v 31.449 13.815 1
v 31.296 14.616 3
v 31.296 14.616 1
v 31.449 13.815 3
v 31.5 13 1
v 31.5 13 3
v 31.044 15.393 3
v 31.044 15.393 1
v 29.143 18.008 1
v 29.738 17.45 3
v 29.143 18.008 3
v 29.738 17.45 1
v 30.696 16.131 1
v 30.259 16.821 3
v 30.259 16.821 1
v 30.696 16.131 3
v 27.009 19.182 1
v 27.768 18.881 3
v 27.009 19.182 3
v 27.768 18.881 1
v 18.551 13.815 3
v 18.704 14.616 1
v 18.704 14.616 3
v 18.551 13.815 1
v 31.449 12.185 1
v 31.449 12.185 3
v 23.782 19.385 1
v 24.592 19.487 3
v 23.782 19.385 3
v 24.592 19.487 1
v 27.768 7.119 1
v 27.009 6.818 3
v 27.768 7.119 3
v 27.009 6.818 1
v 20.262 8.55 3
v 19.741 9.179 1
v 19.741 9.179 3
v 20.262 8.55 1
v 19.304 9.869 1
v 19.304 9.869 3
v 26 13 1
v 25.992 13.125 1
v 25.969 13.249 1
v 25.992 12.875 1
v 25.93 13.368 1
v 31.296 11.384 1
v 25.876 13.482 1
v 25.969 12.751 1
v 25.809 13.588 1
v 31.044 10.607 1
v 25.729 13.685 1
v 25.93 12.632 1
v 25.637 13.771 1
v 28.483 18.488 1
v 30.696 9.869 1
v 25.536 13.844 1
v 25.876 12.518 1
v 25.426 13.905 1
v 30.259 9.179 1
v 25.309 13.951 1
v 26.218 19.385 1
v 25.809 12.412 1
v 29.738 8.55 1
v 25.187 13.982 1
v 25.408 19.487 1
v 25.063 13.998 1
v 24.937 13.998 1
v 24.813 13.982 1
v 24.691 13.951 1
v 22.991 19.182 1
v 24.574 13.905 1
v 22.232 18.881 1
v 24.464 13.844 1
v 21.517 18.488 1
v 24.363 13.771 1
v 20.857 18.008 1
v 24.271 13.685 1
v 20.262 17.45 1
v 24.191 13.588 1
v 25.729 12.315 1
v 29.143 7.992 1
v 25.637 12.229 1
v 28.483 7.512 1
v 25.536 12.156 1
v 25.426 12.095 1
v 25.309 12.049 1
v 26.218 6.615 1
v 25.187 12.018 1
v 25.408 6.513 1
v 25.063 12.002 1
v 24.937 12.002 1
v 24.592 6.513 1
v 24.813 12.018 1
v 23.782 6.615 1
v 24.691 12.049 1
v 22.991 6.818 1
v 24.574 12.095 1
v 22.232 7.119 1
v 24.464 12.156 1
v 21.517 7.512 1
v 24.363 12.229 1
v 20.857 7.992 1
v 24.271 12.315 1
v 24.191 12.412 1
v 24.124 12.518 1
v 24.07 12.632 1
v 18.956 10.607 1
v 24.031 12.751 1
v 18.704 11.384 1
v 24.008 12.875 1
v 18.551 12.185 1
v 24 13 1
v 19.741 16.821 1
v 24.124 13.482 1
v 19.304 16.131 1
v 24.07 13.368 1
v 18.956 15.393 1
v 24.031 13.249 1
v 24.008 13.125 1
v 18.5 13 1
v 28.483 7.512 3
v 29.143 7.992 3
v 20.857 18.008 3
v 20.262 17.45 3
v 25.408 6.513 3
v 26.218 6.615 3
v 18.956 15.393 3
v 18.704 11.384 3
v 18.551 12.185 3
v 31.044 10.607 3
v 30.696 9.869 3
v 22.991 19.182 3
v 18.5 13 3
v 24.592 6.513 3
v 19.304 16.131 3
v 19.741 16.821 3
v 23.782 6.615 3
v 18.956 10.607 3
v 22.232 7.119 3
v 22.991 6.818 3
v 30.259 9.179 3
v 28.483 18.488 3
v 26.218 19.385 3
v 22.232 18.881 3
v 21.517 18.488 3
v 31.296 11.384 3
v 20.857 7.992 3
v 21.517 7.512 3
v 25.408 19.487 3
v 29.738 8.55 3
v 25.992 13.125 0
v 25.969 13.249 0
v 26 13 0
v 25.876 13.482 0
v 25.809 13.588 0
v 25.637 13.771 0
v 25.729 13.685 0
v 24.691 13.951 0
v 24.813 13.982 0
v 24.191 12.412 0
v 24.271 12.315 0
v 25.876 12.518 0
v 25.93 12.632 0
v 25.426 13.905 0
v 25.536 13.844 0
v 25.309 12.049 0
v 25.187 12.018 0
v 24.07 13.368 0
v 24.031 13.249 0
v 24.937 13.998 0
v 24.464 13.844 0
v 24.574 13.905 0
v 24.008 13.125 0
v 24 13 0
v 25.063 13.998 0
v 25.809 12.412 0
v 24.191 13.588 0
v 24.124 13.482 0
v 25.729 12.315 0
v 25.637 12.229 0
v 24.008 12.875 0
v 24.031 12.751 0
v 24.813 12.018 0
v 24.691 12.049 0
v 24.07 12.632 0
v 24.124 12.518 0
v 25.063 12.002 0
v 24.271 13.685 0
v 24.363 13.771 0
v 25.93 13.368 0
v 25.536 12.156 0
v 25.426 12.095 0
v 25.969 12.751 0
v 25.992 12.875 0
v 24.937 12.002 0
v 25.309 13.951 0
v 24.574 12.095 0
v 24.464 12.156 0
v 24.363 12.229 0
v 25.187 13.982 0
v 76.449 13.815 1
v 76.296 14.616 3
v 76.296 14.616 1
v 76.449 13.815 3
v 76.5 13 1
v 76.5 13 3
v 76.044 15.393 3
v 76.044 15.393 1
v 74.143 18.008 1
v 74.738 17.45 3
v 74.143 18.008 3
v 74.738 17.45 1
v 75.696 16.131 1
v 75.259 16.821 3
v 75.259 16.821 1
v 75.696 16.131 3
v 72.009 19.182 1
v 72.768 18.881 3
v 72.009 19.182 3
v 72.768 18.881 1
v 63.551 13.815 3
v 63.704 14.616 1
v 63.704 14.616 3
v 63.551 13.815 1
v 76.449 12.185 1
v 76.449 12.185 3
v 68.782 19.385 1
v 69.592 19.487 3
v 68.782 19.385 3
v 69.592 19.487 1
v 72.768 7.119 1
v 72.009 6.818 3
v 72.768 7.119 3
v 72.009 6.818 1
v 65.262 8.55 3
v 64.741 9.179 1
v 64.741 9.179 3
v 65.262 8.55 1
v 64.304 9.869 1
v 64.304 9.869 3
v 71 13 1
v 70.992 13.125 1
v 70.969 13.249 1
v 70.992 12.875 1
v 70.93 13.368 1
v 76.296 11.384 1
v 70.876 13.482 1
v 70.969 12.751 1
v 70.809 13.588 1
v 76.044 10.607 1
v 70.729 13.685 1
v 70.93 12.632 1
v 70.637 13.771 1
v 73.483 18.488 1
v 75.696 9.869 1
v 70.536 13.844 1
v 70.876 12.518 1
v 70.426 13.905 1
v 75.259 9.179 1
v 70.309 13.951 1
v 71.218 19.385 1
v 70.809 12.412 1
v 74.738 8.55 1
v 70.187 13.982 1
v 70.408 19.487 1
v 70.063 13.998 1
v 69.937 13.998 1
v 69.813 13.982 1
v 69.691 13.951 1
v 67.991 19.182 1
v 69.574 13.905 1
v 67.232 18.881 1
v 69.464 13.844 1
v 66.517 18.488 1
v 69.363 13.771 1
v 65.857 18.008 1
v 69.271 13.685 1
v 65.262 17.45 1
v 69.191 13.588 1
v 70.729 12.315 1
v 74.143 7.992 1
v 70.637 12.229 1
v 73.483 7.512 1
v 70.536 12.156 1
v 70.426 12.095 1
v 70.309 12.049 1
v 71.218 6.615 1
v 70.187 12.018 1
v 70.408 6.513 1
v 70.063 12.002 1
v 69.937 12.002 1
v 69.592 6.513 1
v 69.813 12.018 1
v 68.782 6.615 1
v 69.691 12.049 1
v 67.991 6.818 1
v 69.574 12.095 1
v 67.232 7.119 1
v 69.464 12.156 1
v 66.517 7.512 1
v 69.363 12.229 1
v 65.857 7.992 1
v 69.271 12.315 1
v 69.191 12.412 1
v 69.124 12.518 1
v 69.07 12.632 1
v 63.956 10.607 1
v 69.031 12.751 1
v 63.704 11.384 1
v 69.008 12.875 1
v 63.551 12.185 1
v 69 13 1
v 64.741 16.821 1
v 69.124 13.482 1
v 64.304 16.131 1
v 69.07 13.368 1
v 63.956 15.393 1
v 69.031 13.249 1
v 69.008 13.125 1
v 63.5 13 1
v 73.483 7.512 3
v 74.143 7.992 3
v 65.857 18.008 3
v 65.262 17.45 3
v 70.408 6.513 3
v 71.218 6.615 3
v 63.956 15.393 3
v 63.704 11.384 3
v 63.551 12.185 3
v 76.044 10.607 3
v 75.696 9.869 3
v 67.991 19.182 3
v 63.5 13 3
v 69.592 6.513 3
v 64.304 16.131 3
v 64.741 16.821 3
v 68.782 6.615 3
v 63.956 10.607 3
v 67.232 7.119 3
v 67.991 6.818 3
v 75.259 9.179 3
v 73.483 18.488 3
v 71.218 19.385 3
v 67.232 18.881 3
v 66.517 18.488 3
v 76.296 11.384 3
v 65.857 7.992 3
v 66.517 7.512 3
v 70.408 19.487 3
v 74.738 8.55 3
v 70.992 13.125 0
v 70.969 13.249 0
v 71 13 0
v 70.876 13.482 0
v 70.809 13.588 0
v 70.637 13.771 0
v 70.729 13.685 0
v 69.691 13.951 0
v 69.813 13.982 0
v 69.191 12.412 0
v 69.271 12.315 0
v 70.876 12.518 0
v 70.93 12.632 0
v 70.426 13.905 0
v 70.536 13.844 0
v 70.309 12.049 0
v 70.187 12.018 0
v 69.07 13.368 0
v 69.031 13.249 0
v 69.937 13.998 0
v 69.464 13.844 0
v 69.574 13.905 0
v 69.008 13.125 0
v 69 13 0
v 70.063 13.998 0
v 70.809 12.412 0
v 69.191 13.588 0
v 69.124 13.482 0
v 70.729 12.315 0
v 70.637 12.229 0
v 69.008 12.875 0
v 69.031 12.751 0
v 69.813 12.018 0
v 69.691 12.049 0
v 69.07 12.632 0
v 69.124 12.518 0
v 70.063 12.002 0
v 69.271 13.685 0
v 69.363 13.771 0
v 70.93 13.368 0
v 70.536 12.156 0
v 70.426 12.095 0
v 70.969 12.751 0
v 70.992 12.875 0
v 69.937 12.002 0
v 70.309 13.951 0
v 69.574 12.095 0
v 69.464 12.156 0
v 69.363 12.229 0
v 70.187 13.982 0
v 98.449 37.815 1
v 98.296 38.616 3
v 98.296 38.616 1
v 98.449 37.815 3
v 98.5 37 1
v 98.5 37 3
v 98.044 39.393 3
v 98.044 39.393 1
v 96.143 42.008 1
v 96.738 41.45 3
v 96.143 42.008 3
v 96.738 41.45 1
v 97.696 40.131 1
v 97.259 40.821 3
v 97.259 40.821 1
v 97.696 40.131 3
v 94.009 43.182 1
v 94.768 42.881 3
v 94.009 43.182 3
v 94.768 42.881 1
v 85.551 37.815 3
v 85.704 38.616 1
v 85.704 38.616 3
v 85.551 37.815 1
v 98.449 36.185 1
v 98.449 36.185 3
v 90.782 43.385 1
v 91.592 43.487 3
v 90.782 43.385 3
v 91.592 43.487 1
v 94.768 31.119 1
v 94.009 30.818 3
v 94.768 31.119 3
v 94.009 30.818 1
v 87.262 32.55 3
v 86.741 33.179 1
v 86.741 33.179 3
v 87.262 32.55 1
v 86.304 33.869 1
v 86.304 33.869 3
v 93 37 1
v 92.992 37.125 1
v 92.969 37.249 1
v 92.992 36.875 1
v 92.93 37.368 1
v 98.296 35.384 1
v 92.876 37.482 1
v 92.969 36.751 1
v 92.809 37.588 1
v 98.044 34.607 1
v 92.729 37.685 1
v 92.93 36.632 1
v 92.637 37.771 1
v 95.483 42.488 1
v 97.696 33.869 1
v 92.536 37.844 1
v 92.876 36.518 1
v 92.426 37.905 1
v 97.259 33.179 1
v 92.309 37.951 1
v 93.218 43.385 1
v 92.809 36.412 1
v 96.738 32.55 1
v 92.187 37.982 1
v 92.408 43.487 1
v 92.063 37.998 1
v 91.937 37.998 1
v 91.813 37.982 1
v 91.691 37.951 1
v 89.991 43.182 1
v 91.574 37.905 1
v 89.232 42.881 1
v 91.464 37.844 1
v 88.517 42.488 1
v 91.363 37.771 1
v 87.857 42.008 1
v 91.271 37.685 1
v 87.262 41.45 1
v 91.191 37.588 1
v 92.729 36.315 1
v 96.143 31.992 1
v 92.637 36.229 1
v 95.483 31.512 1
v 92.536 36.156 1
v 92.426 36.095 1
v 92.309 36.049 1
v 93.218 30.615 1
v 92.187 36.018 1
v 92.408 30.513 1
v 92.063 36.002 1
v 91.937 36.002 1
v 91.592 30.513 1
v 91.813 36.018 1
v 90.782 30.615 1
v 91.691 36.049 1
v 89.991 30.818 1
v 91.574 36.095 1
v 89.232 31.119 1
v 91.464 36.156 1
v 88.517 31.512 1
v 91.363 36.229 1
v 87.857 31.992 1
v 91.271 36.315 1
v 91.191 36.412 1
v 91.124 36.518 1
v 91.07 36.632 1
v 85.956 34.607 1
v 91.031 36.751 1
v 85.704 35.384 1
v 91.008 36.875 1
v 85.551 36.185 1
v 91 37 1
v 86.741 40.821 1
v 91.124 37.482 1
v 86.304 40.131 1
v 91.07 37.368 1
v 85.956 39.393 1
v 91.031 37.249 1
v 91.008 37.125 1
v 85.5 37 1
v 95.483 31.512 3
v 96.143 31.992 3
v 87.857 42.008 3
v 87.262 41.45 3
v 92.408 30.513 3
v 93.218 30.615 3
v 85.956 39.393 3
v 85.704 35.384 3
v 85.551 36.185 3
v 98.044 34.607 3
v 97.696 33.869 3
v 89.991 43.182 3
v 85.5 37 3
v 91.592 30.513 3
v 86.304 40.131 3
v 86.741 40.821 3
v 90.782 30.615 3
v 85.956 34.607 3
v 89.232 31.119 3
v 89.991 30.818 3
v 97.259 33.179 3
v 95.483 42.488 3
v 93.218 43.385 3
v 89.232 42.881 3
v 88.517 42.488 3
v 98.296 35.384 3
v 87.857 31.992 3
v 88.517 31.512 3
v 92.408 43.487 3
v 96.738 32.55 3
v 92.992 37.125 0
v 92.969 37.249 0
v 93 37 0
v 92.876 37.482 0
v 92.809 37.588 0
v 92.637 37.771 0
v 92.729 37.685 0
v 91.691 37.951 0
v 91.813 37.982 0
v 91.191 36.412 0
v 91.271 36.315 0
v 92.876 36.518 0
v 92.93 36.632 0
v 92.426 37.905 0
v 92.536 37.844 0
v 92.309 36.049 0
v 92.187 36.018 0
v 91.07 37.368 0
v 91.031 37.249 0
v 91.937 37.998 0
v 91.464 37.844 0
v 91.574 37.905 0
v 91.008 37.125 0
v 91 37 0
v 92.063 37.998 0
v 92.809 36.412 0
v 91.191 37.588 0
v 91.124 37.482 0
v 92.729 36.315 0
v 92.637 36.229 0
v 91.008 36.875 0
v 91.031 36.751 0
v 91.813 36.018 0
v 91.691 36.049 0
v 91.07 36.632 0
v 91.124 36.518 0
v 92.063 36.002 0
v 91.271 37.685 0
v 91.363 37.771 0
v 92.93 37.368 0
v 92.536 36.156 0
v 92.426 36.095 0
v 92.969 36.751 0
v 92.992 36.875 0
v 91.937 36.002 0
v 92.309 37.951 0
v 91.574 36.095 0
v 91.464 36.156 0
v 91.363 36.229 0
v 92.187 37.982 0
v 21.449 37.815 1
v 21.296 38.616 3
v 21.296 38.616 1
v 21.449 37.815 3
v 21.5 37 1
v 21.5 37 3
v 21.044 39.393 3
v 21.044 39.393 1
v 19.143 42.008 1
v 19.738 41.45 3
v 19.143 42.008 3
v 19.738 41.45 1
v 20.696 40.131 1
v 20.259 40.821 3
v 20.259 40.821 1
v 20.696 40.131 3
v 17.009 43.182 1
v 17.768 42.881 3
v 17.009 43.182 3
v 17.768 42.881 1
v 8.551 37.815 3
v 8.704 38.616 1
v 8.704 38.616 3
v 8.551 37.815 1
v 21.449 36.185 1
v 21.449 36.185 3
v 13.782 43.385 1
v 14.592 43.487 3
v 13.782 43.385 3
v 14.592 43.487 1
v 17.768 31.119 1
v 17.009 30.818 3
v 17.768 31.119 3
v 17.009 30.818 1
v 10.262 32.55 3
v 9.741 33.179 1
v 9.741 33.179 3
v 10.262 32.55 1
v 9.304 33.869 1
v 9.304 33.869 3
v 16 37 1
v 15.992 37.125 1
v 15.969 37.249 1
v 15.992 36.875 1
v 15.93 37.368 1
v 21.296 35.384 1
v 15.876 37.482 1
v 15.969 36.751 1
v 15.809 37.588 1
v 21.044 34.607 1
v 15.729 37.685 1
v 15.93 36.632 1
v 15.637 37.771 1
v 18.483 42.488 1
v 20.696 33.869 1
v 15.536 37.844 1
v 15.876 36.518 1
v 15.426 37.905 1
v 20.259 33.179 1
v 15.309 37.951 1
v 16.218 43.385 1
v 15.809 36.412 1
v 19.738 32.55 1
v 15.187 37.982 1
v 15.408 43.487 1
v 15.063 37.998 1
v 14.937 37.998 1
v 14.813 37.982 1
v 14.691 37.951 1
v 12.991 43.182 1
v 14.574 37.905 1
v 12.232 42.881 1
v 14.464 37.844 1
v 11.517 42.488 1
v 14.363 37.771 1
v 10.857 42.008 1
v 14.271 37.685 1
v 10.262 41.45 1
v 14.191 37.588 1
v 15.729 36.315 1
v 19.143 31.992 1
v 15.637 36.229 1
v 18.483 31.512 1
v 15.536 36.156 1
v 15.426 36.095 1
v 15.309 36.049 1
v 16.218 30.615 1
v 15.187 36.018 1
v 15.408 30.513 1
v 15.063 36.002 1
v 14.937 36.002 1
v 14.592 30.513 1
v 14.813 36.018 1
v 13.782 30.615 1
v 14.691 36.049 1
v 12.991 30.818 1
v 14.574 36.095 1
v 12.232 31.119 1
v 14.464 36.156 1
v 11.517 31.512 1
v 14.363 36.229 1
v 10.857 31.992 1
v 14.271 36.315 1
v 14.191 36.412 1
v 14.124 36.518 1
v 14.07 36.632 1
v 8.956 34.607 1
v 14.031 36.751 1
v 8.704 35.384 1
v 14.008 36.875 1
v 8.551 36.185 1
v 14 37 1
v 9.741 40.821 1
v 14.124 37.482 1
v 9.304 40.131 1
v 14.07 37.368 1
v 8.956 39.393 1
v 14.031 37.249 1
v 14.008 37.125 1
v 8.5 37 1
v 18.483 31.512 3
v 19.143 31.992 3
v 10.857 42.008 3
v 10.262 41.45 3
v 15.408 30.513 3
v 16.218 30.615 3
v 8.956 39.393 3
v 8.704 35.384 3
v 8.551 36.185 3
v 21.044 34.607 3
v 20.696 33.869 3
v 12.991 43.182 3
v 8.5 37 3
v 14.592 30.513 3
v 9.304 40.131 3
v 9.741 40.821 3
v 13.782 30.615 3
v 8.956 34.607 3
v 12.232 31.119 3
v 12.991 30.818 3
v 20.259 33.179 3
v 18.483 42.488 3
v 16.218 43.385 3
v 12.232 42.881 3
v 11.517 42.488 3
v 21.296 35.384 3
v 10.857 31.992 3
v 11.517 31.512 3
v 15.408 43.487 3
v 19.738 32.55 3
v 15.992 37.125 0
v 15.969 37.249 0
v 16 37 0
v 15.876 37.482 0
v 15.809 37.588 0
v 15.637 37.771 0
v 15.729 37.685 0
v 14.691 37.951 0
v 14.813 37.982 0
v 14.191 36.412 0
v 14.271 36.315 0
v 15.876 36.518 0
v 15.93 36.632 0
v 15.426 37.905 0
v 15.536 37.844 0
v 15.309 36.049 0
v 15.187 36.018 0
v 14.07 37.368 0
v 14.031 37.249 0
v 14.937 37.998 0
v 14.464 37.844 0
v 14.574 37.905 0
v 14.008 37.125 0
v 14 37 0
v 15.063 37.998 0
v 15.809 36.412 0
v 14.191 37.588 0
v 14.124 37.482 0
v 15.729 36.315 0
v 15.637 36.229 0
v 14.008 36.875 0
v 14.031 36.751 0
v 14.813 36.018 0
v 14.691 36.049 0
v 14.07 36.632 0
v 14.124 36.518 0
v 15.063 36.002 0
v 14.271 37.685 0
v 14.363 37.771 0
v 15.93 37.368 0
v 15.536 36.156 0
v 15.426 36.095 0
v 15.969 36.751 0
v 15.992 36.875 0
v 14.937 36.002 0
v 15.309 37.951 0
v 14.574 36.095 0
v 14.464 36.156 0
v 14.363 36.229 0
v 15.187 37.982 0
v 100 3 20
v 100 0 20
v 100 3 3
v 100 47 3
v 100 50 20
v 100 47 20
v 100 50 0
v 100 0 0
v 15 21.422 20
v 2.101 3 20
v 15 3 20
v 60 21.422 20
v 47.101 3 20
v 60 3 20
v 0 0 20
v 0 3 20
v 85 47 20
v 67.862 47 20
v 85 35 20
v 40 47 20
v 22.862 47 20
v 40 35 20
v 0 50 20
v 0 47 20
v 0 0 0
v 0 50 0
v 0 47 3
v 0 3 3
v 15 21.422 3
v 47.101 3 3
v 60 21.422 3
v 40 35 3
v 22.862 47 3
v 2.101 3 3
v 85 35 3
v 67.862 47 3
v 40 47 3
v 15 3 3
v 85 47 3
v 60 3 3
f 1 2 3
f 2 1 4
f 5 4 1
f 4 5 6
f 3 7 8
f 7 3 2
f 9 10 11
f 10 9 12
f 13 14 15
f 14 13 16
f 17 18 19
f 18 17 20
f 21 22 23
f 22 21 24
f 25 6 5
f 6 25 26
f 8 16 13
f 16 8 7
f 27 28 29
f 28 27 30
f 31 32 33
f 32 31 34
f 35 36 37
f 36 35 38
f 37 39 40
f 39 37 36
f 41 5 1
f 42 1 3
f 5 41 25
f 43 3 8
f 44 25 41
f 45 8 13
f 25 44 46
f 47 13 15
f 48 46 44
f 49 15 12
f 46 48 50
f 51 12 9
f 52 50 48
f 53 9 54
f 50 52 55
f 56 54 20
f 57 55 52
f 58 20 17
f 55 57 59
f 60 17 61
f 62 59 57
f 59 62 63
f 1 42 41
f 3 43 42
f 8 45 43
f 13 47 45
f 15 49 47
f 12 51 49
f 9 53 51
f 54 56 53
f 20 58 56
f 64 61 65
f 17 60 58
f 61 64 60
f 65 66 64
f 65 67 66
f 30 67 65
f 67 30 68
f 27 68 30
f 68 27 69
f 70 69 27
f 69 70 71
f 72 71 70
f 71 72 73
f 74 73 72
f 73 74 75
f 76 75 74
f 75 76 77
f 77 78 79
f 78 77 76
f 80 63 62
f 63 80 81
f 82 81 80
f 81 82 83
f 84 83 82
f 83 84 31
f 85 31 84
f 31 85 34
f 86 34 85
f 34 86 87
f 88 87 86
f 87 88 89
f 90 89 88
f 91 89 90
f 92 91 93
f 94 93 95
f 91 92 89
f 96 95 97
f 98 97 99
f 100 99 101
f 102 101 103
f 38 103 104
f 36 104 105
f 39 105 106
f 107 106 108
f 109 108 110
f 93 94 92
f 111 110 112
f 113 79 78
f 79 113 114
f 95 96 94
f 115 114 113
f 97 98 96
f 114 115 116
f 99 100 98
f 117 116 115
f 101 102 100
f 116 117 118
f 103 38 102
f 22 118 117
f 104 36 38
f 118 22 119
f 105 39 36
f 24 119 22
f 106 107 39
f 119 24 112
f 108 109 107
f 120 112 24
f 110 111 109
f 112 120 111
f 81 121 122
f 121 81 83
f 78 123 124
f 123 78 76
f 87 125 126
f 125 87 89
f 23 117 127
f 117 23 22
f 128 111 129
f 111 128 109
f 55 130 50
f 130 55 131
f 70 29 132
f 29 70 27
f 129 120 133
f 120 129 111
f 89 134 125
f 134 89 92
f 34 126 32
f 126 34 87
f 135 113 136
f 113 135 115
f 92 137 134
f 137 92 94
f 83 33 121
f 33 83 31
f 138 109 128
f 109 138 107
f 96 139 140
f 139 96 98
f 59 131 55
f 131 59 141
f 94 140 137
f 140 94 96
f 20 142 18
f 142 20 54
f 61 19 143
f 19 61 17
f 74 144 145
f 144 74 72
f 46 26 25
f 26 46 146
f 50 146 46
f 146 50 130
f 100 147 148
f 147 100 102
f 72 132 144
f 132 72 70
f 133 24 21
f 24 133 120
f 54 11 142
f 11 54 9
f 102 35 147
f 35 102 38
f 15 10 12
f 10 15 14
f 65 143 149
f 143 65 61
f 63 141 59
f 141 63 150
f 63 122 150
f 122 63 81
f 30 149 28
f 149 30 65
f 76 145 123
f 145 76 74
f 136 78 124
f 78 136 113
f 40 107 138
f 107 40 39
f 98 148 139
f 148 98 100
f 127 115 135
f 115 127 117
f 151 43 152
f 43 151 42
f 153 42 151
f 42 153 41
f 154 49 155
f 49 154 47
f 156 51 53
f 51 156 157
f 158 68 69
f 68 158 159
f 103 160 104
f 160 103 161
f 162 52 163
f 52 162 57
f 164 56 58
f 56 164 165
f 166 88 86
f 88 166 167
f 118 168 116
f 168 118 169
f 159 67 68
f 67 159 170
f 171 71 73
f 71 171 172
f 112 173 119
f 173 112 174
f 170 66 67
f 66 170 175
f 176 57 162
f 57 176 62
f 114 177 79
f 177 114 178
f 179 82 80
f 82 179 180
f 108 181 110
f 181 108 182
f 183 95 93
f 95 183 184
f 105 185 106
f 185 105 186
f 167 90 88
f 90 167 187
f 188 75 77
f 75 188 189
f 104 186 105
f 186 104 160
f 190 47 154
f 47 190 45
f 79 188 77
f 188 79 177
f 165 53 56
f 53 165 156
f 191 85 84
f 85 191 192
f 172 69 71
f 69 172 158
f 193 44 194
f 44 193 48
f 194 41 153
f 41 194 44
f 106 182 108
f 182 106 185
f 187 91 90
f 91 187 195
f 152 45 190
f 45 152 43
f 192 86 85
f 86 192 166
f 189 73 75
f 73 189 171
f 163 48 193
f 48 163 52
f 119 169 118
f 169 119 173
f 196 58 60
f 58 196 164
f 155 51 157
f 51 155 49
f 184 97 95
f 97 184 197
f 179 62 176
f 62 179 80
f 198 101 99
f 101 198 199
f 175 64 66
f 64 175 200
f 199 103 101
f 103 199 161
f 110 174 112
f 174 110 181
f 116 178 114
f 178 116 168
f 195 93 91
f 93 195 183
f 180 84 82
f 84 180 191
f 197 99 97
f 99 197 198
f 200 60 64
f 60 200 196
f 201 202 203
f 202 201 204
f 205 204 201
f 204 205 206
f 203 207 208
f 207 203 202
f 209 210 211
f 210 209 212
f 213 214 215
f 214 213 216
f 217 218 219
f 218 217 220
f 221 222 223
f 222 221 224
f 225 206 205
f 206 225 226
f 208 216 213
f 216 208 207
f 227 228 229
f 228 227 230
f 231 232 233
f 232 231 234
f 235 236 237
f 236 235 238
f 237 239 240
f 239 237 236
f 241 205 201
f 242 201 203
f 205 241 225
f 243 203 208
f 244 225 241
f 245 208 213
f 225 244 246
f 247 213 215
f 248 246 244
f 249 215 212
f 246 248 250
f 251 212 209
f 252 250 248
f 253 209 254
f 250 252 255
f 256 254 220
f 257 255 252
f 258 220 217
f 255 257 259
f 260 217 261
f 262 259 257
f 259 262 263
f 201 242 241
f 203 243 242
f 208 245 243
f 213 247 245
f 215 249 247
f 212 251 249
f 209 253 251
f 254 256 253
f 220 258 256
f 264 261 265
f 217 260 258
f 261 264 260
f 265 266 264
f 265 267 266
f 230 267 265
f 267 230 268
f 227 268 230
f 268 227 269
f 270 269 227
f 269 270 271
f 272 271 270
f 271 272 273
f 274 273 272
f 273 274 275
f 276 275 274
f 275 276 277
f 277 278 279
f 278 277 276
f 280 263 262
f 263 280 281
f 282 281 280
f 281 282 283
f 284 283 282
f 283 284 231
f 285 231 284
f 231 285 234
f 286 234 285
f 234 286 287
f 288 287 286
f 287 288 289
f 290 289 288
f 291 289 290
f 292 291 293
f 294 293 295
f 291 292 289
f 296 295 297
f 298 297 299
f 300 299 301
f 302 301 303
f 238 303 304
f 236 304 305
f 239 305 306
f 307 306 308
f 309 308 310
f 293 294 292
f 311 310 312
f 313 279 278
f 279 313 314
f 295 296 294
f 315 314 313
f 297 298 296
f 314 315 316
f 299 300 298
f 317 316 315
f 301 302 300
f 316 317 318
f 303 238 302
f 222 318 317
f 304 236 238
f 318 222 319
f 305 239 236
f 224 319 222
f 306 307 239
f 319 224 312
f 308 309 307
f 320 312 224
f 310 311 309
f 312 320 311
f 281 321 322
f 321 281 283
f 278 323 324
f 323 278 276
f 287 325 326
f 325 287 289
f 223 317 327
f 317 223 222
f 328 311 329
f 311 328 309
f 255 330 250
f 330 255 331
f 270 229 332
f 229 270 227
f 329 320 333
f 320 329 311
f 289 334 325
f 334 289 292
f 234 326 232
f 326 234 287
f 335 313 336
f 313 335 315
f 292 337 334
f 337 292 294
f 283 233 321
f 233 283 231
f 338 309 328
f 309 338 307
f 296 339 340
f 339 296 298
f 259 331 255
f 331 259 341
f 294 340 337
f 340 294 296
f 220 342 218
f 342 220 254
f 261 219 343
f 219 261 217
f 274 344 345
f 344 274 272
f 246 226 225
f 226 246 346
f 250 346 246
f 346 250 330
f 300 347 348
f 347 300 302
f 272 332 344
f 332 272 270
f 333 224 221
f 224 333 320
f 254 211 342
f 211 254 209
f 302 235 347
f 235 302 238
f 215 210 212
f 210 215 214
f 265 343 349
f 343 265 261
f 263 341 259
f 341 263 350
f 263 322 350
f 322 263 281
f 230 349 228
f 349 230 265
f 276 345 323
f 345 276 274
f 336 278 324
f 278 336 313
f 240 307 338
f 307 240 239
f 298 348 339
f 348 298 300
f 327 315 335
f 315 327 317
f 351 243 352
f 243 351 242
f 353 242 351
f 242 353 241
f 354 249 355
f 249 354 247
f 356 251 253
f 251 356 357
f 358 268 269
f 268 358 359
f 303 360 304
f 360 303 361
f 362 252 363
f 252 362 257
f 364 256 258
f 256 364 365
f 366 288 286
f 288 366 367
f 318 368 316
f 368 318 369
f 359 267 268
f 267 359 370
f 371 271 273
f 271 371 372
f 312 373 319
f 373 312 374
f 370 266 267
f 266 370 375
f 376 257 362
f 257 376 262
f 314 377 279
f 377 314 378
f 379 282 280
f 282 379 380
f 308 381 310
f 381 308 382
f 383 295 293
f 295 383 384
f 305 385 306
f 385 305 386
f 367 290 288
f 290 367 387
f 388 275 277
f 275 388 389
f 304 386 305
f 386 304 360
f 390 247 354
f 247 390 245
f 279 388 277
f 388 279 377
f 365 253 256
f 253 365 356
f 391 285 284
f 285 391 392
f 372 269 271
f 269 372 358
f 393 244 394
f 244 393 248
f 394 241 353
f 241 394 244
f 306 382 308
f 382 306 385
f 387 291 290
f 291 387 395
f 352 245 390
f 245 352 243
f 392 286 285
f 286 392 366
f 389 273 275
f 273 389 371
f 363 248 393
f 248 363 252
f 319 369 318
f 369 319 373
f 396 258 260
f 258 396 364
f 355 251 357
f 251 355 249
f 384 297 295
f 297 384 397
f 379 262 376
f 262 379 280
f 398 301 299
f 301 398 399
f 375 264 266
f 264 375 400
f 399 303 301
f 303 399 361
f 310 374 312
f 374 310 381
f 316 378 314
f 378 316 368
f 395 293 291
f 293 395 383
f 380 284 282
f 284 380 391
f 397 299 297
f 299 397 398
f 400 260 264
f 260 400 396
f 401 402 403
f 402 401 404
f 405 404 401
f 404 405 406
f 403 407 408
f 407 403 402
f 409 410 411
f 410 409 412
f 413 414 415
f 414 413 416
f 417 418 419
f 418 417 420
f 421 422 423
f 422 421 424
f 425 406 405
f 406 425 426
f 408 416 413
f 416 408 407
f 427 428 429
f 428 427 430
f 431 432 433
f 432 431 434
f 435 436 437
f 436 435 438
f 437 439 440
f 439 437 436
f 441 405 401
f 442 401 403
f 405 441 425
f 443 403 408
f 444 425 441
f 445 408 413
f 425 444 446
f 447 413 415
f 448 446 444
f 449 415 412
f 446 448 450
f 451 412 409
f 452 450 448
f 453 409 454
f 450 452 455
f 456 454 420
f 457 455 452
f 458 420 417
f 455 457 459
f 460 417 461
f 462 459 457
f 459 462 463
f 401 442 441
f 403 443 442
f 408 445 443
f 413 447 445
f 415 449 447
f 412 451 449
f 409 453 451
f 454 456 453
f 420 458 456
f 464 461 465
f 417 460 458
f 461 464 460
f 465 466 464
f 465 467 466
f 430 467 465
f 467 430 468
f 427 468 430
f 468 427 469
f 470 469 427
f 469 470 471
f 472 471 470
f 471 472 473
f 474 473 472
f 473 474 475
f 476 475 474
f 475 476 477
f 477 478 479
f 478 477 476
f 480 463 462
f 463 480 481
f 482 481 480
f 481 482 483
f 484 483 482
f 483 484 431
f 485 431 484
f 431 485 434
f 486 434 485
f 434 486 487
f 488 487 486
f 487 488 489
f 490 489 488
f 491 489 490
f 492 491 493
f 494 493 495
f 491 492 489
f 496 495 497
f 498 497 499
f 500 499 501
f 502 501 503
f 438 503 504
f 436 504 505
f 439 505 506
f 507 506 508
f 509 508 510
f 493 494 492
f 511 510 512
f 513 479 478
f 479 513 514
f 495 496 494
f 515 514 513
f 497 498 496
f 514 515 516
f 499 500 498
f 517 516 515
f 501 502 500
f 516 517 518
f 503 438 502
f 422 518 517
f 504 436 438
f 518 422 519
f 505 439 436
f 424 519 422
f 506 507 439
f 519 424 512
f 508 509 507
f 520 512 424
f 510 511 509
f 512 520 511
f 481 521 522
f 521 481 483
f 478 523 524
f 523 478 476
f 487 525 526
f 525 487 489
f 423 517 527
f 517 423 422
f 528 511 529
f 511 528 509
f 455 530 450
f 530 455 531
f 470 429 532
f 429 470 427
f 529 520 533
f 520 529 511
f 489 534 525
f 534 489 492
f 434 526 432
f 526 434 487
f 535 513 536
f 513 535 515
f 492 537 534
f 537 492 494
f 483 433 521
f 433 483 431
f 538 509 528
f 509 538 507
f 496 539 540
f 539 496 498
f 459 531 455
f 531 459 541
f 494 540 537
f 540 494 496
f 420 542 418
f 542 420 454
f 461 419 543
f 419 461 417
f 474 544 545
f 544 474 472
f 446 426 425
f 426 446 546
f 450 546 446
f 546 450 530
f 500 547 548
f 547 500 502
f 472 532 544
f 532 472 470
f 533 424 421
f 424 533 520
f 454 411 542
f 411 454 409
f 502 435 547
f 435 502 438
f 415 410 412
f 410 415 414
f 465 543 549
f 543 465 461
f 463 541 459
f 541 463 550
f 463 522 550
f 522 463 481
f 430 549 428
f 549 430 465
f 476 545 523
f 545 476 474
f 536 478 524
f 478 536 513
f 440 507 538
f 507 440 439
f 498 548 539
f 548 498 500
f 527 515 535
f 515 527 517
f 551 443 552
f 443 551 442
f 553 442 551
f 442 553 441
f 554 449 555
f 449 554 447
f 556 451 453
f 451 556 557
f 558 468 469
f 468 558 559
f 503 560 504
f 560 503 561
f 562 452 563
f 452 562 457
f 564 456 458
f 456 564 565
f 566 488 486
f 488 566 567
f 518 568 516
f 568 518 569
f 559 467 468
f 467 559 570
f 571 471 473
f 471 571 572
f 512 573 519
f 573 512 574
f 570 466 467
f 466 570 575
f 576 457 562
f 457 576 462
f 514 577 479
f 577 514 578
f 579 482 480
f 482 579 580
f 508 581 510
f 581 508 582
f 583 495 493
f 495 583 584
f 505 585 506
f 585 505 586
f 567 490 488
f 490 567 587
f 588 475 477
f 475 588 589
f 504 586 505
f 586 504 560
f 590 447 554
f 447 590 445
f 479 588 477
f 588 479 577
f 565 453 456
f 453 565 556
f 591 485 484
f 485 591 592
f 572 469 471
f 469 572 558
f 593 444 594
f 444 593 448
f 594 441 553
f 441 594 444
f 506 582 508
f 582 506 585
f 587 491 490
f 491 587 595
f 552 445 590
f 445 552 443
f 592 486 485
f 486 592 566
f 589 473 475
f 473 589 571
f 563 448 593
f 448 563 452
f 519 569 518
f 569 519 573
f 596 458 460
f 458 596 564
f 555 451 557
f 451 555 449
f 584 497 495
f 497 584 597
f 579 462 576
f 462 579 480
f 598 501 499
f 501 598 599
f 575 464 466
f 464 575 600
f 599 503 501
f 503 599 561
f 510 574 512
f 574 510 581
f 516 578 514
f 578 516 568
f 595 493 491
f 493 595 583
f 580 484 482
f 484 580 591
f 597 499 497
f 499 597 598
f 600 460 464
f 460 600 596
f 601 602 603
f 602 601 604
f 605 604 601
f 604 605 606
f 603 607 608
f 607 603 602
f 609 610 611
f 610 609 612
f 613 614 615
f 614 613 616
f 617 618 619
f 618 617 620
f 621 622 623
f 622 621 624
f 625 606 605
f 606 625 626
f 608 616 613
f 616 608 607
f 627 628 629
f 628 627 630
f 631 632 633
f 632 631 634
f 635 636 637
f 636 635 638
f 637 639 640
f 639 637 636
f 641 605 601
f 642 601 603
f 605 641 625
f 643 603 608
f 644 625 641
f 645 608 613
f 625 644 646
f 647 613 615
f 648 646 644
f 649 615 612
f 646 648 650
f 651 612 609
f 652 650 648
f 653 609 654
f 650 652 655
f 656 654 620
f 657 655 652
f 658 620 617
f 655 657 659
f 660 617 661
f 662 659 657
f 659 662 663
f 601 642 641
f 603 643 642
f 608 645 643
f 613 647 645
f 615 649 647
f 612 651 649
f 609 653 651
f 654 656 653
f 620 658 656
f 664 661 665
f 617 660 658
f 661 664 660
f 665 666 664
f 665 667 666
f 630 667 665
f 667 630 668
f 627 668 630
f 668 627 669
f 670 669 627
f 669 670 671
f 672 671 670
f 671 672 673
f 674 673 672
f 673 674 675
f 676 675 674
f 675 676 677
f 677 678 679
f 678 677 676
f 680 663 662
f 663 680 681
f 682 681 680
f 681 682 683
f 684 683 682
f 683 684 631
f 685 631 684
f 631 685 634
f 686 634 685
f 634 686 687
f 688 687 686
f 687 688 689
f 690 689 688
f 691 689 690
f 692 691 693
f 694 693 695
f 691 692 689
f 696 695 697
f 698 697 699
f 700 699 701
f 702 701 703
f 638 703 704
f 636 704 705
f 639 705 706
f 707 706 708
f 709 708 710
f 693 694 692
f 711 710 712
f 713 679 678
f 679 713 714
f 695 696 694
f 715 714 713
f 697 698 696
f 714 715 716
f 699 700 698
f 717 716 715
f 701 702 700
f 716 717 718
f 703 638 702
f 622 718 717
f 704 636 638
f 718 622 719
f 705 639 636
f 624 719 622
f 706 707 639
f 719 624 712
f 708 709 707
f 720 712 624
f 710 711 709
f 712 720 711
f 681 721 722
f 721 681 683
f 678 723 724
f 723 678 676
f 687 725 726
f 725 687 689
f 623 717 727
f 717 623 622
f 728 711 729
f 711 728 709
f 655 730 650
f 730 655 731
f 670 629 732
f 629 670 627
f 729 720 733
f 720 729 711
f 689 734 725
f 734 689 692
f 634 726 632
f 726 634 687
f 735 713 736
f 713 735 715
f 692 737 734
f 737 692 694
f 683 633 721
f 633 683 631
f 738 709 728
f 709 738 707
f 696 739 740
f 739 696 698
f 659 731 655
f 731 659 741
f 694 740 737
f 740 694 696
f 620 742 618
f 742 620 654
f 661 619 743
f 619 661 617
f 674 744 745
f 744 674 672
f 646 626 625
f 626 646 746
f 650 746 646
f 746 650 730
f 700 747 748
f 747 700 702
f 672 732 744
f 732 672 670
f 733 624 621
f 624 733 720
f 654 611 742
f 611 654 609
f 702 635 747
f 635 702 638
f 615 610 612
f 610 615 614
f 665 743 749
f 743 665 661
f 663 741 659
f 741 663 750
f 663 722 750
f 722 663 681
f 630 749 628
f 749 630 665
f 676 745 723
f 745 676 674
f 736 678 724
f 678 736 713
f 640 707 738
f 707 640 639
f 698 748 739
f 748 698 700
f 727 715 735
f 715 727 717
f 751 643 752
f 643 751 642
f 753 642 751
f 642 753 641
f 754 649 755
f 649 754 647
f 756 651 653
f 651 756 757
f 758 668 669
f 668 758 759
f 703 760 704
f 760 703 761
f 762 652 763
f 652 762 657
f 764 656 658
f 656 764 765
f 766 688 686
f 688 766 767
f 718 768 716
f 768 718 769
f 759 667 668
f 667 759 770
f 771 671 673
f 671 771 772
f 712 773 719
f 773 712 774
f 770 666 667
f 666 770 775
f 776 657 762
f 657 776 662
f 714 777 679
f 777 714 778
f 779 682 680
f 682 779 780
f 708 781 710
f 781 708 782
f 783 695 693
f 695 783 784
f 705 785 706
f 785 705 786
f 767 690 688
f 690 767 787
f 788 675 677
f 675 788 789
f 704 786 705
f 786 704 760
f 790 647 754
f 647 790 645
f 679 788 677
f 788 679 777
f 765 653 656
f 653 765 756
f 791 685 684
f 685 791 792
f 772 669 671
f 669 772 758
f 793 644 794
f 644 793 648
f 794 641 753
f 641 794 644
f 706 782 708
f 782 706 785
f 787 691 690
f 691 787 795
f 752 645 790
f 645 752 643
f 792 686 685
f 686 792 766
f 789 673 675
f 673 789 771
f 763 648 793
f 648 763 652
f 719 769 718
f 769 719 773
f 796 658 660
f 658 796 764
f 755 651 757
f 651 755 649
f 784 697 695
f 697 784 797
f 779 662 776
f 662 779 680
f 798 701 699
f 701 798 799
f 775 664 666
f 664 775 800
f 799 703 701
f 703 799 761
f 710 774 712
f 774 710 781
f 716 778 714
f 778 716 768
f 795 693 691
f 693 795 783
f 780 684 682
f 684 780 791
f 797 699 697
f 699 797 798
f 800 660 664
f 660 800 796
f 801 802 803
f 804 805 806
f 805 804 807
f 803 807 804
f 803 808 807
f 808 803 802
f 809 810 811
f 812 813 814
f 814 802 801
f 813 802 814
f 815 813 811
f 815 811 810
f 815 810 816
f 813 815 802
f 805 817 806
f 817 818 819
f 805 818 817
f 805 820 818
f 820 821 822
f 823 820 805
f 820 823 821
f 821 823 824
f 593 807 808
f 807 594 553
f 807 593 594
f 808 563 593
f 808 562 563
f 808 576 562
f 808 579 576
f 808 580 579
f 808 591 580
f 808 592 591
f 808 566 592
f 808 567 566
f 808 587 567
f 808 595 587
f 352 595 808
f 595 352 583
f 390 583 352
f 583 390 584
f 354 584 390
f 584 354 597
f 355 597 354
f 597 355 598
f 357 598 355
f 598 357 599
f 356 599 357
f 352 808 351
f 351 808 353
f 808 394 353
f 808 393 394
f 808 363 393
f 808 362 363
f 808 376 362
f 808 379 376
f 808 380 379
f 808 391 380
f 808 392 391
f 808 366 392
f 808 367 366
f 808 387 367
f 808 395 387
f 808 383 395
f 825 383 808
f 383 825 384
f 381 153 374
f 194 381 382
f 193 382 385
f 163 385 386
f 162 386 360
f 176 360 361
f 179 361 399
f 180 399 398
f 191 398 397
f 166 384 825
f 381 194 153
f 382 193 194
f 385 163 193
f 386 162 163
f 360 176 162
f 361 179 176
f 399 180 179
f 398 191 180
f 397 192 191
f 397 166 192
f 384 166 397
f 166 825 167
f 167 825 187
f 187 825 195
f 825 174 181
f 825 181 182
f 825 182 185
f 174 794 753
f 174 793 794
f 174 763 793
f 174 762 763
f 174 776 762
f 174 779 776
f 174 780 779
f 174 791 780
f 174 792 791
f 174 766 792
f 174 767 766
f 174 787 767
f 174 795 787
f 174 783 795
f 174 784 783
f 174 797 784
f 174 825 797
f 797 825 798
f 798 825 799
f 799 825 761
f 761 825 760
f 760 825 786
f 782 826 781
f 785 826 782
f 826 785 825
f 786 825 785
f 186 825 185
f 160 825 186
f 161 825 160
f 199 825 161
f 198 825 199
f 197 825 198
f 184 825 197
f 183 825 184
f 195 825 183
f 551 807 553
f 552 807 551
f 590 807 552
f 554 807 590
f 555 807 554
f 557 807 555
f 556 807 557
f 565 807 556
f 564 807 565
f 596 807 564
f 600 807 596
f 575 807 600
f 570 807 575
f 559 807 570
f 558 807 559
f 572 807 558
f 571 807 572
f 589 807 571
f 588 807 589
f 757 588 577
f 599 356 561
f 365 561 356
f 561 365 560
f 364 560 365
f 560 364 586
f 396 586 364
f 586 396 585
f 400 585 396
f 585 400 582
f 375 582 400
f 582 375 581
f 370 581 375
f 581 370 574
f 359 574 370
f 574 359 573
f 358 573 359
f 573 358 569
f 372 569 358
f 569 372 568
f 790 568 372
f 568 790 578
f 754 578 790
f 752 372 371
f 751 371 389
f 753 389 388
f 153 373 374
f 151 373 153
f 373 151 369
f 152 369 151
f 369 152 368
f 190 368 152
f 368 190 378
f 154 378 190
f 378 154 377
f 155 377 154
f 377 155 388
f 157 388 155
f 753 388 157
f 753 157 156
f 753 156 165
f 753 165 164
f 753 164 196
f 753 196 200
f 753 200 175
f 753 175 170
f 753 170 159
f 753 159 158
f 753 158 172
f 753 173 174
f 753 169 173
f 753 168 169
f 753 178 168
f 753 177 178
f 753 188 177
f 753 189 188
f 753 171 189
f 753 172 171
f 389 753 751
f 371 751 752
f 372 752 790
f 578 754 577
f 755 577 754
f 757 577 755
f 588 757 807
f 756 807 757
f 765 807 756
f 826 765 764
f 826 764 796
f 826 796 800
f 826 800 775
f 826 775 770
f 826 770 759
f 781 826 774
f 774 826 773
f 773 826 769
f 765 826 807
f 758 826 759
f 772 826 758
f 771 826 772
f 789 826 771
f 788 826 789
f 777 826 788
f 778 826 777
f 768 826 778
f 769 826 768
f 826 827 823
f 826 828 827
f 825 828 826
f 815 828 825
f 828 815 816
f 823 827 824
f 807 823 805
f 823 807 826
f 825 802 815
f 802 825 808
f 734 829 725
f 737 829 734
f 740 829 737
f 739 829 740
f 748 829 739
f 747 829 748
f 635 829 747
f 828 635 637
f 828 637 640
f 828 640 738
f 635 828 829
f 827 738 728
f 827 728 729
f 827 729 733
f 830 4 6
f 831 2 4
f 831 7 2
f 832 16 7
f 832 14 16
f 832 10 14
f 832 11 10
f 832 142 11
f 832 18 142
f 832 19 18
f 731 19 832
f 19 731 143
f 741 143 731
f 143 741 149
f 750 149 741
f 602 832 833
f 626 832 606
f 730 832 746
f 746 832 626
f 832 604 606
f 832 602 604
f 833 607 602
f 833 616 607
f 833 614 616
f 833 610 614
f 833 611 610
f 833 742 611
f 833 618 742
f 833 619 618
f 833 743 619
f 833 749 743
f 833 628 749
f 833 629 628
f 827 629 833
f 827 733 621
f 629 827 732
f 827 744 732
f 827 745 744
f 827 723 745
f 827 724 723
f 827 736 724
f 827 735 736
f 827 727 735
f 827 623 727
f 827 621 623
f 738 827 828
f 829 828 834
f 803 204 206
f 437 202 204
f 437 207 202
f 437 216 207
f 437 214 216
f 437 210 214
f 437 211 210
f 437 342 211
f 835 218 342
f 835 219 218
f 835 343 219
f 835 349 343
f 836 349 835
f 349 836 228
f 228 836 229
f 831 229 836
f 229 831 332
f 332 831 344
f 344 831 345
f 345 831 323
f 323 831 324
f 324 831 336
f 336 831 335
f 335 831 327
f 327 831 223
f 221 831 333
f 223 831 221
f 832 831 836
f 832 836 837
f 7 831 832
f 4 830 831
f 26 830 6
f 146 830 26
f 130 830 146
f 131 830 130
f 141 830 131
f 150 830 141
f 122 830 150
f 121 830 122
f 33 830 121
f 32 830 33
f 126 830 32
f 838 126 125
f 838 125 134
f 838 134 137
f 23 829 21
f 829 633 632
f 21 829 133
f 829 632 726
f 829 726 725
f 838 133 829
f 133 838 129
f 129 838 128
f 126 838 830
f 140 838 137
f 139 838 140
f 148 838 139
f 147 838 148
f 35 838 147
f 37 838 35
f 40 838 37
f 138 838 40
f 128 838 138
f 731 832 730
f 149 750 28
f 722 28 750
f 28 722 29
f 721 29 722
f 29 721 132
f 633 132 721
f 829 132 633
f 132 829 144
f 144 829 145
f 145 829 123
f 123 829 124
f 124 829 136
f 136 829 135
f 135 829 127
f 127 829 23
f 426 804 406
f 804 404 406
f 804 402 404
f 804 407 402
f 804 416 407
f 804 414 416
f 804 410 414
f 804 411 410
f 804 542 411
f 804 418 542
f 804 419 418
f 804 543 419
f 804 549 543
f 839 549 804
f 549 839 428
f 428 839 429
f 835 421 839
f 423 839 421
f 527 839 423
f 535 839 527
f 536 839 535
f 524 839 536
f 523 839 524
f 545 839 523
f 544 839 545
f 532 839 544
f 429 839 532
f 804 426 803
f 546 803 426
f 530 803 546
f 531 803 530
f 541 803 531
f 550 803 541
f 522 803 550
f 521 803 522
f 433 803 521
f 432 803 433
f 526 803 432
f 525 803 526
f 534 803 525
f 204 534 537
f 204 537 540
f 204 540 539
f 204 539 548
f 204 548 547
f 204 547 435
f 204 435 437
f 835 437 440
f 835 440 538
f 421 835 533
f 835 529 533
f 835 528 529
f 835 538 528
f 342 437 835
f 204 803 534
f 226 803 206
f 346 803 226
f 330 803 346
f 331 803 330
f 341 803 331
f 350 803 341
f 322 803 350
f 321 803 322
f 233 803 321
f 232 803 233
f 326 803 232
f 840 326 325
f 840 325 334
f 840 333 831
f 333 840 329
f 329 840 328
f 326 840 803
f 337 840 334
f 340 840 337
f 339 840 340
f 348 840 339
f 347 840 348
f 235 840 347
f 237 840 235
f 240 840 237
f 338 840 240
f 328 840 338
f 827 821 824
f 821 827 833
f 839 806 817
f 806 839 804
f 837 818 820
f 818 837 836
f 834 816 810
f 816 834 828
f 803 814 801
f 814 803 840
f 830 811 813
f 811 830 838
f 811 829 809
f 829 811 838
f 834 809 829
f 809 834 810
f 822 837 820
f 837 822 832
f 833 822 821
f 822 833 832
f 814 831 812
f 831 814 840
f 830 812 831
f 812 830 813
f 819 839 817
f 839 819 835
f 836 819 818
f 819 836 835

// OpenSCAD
box_width=100;
box_depth=50;
box_height=20;
thickness=3;

//resolution
$fn=50;

difference()
{
   
// the big cube
cube([box_width,box_depth, box_height]);
translate([-0.5,thickness,thickness])
cube([box_width+1,box_depth-2*thickness, box_height+1]);

translate([25,13,0])
thumbtack_hole();

translate([70,13,0])
thumbtack_hole();

translate([92,37,0])
thumbtack_hole();

translate([15,37,0])
thumbtack_hole();

}





module ledge()
{
translate([0,0,0])
difference()
{
cube([15,30,box_height]);
rotate([0,0,55])
cube([60,30,box_height]);
}
}


// 1st ledge
ledge();

// 2nd ledge
rotate([0,0,90])
translate([35,-40,0])
ledge();

// 3rd ledge
translate([45,0,0])
ledge();

// 4th ledge
rotate([0,0,90])
translate([35,-85,0])
ledge();

module thumbtack_hole()
{
translate([0,0,1])
cylinder(r=6.5,h=8);

translate([0,0,-4])
cylinder(r=1,h=15);
}
